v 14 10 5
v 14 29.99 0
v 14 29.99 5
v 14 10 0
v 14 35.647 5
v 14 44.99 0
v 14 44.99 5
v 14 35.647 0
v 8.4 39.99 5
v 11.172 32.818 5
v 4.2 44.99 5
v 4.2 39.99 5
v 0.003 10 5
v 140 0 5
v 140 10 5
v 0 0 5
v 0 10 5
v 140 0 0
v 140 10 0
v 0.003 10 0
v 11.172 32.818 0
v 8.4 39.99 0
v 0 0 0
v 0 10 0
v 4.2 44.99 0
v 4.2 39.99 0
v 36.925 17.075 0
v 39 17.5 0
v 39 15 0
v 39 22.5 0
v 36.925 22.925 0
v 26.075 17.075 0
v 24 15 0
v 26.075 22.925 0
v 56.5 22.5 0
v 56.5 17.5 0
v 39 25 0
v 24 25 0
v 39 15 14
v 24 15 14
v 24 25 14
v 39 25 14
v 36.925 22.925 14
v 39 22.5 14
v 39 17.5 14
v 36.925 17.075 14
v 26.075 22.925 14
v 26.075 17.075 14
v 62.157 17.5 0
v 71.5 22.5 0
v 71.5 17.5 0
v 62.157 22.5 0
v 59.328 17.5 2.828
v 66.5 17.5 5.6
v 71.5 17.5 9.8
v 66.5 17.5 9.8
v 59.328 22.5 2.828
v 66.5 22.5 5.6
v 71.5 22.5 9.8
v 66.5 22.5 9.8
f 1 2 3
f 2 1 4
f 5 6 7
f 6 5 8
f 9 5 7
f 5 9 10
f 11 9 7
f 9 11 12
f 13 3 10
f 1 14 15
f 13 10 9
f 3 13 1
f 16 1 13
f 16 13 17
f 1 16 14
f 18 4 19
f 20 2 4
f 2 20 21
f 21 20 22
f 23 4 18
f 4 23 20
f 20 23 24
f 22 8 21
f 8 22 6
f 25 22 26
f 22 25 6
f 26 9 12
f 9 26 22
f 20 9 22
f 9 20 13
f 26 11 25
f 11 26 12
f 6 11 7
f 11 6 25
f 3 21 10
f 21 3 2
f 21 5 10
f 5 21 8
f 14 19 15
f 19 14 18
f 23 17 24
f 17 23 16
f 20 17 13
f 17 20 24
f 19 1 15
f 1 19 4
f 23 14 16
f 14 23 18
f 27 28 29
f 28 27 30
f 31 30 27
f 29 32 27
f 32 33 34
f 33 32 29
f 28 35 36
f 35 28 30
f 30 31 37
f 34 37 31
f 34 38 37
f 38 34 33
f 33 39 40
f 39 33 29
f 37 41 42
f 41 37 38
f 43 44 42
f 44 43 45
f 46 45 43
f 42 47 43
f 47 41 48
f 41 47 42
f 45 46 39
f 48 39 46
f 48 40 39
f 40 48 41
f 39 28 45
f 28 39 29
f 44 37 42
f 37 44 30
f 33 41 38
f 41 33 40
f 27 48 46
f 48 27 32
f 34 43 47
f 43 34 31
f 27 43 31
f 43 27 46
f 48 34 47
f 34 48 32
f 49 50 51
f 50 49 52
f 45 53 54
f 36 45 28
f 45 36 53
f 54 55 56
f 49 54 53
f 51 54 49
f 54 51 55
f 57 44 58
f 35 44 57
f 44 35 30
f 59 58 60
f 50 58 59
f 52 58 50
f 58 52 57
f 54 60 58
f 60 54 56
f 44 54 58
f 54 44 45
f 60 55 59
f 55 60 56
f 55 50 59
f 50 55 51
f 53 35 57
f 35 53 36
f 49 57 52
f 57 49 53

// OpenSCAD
/*
  Slide Clamp
  version 1.0
  2013-06-06
  by Kirk Saathoff
*/


/* [Global] */

// Rod Length is the total lenth of the clamp
rodLen = 140;

// Rod Width is the width of the clamp rod
rodWidth = 10;

// Rod Thickness is the thickess of the clamp rod
rodThickness = 5;

// Jaw Length
jawLen = 30;

// Jaw Width
jawWidth = 14;

// Vee Depth
veeDepth = 4;

// Clearance for slider opening
clearance = 0.85;

/* [Hidden] */

hookLen = jawWidth*.7;

slideWidth = rodWidth+rodThickness;
slideDepth = rodThickness*2;

clearanceHalf = clearance/2;

module hook()
{
//	color("red")
        	cube([hookLen, rodThickness*1, rodThickness]);
}

module vee(_jawLen)
{
	echo("jawLen in vee", _jawLen);
//	color("red")
	translate([jawWidth, _jawLen-rodThickness*2, -0.01])
	rotate([0, 0, 45])
	{
        	cube([veeDepth, veeDepth, rodThickness+.02]);
	}
}

module Jaw(offset)
{
//	echo("jawLen", jawLen);

	_jawLen = jawLen + offset;
	echo("_jawLen in Jaw", _jawLen);

	jawAngle = atan((jawWidth*.6)/_jawLen);
	jawHyp = jawLen/cos(jawAngle);

	difference() {
		union() {
			difference()
			//union() 
			{
		     	cube([jawWidth, _jawLen, rodThickness]);
		    		 	rotate(-jawAngle) { 
						translate([-jawWidth, 0, -0.01]) 
							cube([jawWidth, jawHyp, rodThickness+.02]);
				}
			}
		    translate([jawWidth-(hookLen), _jawLen, 0]) hook();
		}
	    vee(_jawLen);
	}
}

module slider()
{
//    jawLen = 25;
	union() {
		difference()
		//union() 
		{
			cube([jawWidth, slideWidth, slideDepth]);
			translate([-0.01, (slideWidth/2-(rodWidth/2))-clearanceHalf, 
				(slideDepth/2-(rodThickness/2))-clearanceHalf]) {
				cube([jawWidth+.02, rodWidth+clearance, rodThickness+clearance]);
			}
		}
		translate([0, slideWidth, (slideDepth/2)-(rodThickness/2)]) {
			Jaw(-5/2);
		}
	}
}

module rod()
{
	union()
	{
		cube([rodLen, rodWidth, rodThickness]);
		translate([0, rodWidth-0.01, 0]) {
			Jaw(0);
		}
	}
}

module print_part() {

	rod();
	translate([jawWidth+rodThickness+5, 15+slideDepth, jawWidth]) {
		rotate([0, 0, 0])
		rotate([90, 90, 0])
		{
			slider();
		}
	}
}

print_part();
